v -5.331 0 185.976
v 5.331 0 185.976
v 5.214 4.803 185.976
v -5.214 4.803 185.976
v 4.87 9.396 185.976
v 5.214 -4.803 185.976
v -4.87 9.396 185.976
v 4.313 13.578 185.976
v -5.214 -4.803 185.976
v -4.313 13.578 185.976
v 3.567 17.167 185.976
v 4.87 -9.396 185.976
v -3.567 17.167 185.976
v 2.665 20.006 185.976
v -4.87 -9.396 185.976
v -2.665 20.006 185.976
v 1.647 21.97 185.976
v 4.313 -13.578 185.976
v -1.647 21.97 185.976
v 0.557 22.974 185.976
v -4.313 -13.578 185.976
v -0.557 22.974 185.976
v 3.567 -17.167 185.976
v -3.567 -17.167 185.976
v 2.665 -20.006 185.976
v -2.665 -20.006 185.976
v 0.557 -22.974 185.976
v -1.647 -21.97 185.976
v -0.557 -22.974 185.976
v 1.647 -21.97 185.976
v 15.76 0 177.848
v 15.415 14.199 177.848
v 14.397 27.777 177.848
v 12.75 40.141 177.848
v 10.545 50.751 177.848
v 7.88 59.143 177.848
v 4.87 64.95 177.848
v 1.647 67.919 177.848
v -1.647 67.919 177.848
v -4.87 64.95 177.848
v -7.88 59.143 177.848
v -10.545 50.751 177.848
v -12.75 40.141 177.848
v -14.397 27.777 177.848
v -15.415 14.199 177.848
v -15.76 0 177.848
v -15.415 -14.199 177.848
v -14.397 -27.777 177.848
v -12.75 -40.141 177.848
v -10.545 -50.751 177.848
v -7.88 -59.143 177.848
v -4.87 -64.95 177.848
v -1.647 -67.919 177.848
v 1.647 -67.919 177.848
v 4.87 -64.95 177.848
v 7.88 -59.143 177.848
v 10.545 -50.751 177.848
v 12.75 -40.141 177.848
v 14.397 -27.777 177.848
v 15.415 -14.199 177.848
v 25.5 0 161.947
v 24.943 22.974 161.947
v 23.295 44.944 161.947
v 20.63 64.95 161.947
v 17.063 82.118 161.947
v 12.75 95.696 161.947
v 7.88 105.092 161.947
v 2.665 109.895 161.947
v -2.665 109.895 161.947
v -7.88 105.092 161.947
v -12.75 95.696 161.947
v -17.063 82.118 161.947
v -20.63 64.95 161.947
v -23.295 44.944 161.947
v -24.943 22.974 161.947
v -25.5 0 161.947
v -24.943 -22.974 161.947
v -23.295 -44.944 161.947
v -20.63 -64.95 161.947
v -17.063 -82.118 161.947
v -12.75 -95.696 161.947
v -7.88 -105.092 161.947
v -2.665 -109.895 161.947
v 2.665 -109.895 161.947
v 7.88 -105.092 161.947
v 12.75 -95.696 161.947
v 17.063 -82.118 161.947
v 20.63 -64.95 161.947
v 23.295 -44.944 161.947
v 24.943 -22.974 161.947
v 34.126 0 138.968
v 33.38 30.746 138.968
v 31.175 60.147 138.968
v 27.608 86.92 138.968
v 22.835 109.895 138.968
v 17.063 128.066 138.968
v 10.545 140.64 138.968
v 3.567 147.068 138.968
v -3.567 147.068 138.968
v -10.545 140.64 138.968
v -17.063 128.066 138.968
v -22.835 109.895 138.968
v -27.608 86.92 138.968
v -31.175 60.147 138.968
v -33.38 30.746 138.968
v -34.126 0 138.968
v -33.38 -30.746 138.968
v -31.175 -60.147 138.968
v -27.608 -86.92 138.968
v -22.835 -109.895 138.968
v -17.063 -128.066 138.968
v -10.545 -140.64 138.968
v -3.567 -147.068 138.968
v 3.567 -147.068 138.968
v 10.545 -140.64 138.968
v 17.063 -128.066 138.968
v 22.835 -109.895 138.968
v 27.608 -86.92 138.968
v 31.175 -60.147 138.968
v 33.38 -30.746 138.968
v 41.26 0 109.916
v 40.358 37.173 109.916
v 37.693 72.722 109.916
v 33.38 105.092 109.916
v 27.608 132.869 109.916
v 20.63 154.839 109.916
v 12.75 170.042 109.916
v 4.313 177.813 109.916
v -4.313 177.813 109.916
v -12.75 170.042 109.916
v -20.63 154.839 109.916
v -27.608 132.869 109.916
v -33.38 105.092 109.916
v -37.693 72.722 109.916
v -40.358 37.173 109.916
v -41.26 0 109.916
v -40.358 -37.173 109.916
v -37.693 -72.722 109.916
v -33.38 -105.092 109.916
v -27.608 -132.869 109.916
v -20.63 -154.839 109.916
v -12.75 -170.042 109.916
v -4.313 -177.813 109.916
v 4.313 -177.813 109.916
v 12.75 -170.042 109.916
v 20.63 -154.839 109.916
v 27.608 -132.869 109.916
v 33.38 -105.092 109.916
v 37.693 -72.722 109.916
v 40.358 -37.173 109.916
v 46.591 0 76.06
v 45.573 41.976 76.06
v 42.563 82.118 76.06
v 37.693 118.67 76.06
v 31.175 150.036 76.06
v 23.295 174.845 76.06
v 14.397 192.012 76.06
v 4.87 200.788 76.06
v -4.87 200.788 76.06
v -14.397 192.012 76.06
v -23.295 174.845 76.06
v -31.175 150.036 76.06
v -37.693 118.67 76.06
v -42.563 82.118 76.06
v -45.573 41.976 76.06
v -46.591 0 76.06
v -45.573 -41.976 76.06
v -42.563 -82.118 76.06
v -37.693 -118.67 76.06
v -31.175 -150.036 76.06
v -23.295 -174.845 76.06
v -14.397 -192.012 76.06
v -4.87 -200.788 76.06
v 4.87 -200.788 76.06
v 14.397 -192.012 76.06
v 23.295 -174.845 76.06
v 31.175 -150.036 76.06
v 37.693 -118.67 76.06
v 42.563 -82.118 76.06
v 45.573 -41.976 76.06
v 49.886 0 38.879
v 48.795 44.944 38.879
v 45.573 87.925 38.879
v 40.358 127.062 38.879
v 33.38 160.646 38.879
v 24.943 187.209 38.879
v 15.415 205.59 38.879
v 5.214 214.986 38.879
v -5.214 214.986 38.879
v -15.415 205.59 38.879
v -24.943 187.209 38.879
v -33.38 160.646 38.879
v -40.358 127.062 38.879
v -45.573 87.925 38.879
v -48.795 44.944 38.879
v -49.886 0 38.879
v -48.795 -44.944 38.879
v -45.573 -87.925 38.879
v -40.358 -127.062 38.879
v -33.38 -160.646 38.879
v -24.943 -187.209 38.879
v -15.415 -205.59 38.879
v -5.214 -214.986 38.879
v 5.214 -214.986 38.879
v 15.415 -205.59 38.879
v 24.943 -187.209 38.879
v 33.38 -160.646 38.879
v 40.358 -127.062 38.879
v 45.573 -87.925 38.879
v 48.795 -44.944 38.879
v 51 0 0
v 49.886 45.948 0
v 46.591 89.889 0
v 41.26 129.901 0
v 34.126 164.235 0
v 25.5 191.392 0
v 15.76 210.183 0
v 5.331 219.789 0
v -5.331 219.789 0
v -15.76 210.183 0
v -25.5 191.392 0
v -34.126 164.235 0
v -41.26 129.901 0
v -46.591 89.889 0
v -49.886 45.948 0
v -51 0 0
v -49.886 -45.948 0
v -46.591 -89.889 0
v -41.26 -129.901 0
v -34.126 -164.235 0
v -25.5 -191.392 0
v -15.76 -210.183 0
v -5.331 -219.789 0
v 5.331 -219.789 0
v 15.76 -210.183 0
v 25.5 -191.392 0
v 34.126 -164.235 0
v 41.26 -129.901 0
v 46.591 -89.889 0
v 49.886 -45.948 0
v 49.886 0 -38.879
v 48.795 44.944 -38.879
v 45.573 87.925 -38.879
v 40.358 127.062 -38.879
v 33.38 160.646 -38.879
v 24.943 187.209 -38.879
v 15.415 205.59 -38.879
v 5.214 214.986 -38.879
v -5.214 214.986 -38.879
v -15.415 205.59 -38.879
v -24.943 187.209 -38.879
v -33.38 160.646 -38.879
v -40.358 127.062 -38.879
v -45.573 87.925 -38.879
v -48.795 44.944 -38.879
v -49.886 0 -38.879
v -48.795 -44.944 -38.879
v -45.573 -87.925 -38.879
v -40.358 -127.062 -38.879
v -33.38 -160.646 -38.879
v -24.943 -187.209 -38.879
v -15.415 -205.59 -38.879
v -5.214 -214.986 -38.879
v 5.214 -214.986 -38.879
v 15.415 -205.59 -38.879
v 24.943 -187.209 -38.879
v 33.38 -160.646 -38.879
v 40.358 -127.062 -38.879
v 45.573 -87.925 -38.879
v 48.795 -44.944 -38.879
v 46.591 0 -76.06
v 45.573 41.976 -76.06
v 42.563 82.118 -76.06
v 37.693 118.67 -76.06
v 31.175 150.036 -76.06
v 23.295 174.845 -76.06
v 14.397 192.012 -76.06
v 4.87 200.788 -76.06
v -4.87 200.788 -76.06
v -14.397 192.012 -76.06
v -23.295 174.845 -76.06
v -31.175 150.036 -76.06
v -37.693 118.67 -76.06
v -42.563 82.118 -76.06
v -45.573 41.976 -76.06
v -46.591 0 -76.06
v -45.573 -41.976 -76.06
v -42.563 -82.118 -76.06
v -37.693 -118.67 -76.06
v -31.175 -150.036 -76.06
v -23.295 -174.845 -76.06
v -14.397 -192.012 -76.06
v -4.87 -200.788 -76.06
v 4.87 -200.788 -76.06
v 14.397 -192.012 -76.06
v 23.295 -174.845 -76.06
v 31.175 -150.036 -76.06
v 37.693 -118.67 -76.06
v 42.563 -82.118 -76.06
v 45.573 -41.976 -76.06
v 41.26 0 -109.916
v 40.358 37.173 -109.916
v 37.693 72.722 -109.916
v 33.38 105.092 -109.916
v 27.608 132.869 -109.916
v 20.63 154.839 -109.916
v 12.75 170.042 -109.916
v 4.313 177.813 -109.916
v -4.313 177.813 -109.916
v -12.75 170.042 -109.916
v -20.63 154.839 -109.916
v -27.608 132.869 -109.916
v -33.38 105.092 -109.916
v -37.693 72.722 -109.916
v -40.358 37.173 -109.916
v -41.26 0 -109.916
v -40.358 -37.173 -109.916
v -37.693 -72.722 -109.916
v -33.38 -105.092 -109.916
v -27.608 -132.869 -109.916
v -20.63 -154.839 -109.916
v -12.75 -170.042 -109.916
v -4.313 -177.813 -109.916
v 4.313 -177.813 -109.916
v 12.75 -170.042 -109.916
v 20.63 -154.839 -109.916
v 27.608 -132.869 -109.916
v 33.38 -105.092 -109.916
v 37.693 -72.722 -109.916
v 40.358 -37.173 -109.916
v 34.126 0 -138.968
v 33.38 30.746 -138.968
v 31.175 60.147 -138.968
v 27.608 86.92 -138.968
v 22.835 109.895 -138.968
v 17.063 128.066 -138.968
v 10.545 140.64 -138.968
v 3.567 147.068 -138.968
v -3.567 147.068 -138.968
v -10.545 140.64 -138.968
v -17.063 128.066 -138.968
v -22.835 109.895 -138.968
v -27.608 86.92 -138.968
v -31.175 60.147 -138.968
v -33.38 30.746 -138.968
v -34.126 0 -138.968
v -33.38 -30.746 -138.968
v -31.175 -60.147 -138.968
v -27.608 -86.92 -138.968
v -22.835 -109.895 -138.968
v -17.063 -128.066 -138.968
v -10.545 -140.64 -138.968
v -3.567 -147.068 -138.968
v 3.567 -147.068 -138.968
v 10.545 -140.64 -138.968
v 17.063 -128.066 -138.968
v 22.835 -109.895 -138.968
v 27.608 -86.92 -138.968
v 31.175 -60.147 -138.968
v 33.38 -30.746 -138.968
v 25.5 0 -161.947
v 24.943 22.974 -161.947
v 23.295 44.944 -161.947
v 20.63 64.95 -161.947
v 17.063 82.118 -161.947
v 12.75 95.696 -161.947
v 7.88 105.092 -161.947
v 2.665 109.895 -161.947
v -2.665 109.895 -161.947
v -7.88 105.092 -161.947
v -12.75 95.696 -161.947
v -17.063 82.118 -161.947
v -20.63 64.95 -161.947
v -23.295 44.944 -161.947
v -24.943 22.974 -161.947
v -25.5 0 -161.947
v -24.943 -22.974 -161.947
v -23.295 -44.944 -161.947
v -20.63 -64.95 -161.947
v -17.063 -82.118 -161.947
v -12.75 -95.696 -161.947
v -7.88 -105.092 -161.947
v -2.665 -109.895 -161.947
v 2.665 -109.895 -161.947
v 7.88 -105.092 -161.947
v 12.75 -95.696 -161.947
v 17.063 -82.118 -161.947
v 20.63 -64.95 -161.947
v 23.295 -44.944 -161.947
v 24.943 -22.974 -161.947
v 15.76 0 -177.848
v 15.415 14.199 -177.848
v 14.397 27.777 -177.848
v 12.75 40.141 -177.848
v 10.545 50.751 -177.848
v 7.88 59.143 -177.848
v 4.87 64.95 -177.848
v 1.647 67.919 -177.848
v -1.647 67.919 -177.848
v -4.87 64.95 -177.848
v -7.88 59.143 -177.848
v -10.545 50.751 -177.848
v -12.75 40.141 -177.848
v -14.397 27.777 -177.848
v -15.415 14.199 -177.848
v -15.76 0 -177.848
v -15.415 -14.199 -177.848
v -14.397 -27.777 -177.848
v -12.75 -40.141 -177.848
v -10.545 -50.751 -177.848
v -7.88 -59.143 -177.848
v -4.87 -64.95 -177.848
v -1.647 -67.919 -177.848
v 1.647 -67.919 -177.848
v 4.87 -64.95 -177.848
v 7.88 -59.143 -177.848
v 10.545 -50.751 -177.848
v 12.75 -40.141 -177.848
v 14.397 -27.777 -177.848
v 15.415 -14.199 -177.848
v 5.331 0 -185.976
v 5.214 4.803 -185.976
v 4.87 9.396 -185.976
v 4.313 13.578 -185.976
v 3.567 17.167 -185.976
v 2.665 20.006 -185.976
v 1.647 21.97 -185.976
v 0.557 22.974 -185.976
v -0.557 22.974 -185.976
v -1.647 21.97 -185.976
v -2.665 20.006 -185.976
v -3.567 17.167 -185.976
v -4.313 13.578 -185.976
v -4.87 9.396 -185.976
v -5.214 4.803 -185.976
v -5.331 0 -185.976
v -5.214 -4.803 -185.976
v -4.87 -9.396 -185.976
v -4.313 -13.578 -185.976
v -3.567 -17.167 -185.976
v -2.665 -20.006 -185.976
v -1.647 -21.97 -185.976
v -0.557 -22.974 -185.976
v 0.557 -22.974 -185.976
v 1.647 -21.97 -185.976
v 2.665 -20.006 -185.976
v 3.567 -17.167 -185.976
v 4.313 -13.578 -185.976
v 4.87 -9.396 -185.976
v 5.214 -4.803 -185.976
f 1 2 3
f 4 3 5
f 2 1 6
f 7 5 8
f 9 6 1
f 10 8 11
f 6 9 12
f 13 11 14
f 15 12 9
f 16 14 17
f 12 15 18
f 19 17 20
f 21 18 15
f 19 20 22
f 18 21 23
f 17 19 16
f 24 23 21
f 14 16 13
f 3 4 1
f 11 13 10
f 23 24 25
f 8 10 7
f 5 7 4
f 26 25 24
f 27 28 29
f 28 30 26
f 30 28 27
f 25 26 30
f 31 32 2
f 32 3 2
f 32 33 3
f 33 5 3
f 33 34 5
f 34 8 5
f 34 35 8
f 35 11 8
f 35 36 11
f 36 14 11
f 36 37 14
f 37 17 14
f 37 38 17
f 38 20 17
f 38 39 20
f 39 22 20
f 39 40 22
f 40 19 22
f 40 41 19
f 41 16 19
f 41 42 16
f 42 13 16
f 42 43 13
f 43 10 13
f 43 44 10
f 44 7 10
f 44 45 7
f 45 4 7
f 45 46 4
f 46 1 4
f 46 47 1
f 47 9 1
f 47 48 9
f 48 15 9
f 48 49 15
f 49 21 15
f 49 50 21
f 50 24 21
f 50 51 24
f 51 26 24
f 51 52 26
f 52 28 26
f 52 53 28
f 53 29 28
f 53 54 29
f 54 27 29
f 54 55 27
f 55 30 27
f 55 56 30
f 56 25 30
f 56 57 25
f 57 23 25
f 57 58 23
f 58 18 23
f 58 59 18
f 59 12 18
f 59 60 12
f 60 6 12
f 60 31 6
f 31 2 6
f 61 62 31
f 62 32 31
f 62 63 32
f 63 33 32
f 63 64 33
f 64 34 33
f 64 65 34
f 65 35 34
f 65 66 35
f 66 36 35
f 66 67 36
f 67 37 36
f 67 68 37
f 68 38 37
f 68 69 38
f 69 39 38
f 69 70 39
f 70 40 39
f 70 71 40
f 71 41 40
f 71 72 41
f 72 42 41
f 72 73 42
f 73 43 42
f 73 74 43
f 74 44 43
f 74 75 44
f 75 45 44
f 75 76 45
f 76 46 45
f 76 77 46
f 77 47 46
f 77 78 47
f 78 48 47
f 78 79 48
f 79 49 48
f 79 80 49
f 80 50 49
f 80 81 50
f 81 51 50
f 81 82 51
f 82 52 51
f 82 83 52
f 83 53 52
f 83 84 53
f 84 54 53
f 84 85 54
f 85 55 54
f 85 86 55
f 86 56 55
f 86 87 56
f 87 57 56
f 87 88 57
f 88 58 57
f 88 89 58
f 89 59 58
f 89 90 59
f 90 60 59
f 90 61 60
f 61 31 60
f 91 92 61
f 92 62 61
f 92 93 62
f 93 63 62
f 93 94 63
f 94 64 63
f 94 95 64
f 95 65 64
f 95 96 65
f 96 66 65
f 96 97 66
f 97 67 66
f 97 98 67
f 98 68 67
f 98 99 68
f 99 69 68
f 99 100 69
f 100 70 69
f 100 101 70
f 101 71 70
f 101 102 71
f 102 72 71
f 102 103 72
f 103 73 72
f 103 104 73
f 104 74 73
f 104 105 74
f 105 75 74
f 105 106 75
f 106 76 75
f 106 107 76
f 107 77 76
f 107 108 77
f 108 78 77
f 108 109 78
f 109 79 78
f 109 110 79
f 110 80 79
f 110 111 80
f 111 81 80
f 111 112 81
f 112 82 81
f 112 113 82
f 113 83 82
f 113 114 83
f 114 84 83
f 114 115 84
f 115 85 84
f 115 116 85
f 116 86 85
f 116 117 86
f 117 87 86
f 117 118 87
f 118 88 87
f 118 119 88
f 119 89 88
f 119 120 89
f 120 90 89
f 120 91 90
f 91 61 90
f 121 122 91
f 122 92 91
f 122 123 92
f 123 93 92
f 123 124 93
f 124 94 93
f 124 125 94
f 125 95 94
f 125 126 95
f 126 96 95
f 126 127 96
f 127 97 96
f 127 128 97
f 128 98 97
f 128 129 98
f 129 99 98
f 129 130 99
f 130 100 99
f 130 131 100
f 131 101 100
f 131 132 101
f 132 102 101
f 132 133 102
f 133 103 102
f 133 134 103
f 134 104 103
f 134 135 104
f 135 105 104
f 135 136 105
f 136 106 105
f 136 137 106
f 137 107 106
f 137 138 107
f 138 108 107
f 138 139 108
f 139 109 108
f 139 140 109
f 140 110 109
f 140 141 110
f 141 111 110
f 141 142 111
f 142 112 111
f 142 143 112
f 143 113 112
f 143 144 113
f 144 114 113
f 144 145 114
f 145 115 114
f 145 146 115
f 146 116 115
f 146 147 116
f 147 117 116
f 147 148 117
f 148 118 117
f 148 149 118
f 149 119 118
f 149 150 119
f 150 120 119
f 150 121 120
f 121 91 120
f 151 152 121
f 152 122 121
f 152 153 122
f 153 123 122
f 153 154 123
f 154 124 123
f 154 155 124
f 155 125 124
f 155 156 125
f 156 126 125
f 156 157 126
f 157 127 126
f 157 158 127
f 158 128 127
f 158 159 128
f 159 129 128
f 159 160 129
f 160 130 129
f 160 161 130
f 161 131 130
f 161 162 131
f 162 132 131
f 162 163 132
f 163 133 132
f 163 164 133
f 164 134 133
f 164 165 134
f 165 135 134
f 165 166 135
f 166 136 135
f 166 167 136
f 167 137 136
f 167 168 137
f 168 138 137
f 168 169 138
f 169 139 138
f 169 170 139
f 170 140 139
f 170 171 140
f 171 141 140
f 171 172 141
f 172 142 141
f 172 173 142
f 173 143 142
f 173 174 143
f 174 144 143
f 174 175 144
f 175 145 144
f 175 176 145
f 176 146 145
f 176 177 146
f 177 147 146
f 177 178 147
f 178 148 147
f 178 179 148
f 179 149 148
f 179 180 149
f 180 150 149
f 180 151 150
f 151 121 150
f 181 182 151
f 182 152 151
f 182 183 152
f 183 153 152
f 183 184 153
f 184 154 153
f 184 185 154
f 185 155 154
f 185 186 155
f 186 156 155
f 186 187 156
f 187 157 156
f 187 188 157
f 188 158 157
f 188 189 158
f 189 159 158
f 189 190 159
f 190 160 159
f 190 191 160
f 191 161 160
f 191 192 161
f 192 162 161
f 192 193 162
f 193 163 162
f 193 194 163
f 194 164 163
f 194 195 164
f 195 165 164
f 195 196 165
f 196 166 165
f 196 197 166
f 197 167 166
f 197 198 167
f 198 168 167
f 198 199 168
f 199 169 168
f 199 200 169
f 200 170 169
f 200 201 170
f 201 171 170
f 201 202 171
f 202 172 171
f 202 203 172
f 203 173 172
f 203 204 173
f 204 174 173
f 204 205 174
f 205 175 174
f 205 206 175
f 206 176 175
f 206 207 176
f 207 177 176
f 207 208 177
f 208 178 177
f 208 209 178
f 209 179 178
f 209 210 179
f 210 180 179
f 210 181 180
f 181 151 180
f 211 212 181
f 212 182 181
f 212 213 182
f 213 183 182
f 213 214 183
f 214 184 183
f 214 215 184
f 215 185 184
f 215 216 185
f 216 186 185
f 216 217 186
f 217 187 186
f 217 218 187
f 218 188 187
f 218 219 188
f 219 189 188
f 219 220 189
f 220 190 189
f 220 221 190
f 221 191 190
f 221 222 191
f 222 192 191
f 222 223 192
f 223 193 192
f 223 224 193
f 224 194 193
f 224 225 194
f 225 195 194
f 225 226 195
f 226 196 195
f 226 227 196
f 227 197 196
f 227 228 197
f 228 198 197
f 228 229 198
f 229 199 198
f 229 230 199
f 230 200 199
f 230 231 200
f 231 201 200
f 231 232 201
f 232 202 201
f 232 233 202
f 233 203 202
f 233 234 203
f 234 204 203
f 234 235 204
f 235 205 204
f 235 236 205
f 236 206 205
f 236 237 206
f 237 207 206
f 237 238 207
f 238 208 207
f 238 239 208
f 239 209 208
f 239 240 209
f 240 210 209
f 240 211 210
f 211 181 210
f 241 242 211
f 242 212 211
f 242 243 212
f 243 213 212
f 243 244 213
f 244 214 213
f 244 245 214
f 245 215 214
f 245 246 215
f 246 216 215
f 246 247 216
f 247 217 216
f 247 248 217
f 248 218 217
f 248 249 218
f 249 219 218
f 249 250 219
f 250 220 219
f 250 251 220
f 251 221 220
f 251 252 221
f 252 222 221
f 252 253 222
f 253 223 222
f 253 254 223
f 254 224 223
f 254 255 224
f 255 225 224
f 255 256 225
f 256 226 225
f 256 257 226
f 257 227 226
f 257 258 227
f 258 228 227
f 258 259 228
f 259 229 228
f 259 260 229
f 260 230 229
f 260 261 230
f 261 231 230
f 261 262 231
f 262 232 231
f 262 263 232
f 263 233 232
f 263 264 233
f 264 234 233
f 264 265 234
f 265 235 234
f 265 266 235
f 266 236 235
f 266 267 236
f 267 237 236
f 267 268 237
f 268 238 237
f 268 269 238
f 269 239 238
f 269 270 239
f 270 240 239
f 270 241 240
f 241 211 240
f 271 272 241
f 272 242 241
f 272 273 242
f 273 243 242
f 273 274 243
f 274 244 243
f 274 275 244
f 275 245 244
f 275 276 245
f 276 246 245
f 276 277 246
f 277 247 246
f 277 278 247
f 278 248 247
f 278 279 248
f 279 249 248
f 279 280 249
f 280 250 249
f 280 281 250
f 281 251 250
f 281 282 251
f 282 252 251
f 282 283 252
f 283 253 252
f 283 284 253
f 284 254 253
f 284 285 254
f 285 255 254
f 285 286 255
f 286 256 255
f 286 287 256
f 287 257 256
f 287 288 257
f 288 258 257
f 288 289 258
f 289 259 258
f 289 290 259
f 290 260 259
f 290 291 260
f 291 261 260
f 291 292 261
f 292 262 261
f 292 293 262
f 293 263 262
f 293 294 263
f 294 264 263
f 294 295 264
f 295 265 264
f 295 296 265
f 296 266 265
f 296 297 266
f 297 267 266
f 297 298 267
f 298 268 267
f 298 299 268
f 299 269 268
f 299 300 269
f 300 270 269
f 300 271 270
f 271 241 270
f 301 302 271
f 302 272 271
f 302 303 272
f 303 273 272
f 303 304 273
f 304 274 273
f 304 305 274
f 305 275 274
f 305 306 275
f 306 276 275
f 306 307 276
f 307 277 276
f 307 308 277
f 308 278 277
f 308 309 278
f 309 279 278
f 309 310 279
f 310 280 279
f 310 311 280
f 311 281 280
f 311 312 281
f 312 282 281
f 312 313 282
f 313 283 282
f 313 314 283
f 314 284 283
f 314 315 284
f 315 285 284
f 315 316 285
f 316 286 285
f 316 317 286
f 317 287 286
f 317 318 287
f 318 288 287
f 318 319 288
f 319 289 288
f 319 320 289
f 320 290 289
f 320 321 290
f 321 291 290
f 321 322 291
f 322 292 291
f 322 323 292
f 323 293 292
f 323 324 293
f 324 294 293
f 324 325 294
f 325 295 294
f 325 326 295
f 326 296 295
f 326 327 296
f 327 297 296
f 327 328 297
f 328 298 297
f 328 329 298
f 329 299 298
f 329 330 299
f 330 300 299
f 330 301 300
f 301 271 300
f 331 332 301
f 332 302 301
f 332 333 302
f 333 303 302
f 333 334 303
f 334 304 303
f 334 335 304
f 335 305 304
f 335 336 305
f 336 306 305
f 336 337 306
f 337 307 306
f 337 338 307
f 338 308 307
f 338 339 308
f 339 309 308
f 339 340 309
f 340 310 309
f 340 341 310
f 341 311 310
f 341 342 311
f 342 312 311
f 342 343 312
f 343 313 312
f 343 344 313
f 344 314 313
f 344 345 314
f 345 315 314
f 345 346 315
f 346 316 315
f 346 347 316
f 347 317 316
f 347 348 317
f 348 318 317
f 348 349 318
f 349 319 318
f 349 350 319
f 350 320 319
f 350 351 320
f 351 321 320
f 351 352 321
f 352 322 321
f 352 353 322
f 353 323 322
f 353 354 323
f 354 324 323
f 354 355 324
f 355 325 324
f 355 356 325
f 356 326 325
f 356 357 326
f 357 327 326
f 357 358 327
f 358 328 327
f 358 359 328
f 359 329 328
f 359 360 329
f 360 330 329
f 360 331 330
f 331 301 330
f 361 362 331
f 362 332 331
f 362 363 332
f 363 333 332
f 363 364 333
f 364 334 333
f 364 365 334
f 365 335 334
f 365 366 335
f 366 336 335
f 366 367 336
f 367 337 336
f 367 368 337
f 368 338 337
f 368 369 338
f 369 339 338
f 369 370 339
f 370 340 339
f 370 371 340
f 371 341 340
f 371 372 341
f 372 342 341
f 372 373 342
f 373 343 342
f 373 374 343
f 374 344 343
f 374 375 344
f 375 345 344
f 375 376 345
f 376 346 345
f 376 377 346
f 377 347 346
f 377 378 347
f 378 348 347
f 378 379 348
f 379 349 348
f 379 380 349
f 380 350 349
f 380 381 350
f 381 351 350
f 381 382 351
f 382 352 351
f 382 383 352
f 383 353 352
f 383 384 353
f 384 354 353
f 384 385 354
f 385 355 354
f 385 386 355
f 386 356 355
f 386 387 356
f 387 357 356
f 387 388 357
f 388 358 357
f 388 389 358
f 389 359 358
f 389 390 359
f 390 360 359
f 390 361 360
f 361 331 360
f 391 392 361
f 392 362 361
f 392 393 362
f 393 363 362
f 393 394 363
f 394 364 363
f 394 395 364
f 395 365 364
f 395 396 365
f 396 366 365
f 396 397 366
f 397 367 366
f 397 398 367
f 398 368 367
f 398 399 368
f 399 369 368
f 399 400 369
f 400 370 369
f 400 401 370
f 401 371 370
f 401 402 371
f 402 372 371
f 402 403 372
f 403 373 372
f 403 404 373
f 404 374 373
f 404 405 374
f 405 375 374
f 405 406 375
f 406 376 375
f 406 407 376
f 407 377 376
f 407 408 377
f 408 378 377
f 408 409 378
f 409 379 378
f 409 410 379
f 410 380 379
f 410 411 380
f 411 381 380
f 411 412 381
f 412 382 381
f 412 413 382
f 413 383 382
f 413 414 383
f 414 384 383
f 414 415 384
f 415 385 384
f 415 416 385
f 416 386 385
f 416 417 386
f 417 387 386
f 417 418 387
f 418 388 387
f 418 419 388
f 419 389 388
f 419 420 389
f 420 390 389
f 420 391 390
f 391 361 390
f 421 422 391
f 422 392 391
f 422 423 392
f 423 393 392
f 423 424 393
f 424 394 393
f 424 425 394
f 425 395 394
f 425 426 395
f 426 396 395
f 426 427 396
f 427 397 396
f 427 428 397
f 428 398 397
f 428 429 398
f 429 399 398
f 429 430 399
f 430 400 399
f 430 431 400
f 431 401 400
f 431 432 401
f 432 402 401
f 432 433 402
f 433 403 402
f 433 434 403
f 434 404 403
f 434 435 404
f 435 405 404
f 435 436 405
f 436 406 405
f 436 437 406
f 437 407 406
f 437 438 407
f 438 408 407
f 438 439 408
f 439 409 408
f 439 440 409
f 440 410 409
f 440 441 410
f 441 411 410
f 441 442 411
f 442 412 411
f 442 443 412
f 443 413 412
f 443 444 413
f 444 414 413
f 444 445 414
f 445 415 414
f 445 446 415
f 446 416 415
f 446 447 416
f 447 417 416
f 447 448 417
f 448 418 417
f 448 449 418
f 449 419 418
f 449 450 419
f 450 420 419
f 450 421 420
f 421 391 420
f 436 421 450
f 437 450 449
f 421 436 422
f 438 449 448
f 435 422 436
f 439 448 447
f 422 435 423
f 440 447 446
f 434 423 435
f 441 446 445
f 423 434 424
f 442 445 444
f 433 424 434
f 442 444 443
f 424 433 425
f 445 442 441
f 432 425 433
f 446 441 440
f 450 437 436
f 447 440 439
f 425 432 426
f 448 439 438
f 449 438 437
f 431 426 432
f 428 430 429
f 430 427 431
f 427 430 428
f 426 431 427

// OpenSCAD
// Generated by SolidPython 1.0.1 on 2020-07-29 00:46:45


scale(v = [3, 13, 11]) {
	sphere(r = 17);
}
/***********************************************
*********      SolidPython code:      **********
************************************************
 
# import packages: SolidPython
from solid import *
from solid.utils import *
from itertools import chain, combinations, permutations


class Resize:

    def __init__(self, scad_file):
        self.scad_file = scad_file
        #self.scad_file = import_scad(scad_file)
        # cone/cylinder param:
        self.r1 = 0
        self.r2 = 0
        self.h = 0
        # rectangular prism param:
        self.w = 0
        self.l = 0
        # ellipse param:
        self.r = 0

    # import OpenScad code (file name corresponds to shape)


    # classify shape + parameters
    def assign(self, param1, param2, param3):
        if self.scad_file == 'cone.scad':
            self.r1 = param1
            self.r2 = param2
            self.h = param3
        elif self.scad_file == 'cylinder.scad':
            self.r1 = param1
            self.r2 = param2
            self.h = param3
        elif self.scad_file == 'rectangularPrism.scad':
            self.h = param1
            self.l = param2
            self.w = param3
        else:
            self.r = param1
            self.h = param2

    # resize parameters
    def iterate(self):
        x = range(3, 20, 2)
        i = 1
        if self.scad_file == 'cone.scad':
            tempList = list(permutations(x, 2))
            for temp in tempList:
                param1 = temp[0]
                param2 = temp[1]
                filepath = 'produced_scad_files/' + 'cone' + str(param1) + '_' + str(param2) + '_' + '.scad'
                scad_render_to_file(cylinder(h=param1, r1=param2, r2=0), filepath)

        elif self.scad_file == 'cylinder.scad':
            tempList = list(permutations(x, 3))
            for temp in tempList:
                param1 = temp[0]
                param2 = temp[1]
                filepath = 'produced_scad_files/' + 'cylinder' + str(param1) + '_' + str(param2) + '_' + '.scad'
                scad_render_to_file(cylinder(h=param1, r1=param2, r2=param2), filepath)

        elif self.scad_file == 'rectangularPrism.scad':
            tempList = list(permutations(x, 3))
            for temp in tempList:
                param1 = temp[0]
                param2 = temp[1]
                param3 = temp[2]
                filepath = 'produced_scad_files/' + 'rectangularPrism' + str(param1) + '_' + str(param2) + '_' + str(
                    param3) + '.scad'
                scad_render_to_file(cube(size=(param1, param2, param3)), filepath)

        elif self.scad_file == 'ellipse.scad':
            tempList = list(permutations(x, 4))
            for temp in tempList:
                param1 = temp[0]
                param2 = temp[1]
                param3 = temp[2]
                param4 = temp[3]
                filepath = 'produced_scad_files/' + 'ellipse' + str(param1) + '_' + str(param2) + '_' + str(param3) + '_' + str(param4) + '.scad'
                scad_render_to_file(scale([param1, param2, param3])(sphere(r=param4)), filepath)

    def render_to_scadfile(self):
        scad_render_to_file(scad, 'example.scad') 
 
************************************************/
